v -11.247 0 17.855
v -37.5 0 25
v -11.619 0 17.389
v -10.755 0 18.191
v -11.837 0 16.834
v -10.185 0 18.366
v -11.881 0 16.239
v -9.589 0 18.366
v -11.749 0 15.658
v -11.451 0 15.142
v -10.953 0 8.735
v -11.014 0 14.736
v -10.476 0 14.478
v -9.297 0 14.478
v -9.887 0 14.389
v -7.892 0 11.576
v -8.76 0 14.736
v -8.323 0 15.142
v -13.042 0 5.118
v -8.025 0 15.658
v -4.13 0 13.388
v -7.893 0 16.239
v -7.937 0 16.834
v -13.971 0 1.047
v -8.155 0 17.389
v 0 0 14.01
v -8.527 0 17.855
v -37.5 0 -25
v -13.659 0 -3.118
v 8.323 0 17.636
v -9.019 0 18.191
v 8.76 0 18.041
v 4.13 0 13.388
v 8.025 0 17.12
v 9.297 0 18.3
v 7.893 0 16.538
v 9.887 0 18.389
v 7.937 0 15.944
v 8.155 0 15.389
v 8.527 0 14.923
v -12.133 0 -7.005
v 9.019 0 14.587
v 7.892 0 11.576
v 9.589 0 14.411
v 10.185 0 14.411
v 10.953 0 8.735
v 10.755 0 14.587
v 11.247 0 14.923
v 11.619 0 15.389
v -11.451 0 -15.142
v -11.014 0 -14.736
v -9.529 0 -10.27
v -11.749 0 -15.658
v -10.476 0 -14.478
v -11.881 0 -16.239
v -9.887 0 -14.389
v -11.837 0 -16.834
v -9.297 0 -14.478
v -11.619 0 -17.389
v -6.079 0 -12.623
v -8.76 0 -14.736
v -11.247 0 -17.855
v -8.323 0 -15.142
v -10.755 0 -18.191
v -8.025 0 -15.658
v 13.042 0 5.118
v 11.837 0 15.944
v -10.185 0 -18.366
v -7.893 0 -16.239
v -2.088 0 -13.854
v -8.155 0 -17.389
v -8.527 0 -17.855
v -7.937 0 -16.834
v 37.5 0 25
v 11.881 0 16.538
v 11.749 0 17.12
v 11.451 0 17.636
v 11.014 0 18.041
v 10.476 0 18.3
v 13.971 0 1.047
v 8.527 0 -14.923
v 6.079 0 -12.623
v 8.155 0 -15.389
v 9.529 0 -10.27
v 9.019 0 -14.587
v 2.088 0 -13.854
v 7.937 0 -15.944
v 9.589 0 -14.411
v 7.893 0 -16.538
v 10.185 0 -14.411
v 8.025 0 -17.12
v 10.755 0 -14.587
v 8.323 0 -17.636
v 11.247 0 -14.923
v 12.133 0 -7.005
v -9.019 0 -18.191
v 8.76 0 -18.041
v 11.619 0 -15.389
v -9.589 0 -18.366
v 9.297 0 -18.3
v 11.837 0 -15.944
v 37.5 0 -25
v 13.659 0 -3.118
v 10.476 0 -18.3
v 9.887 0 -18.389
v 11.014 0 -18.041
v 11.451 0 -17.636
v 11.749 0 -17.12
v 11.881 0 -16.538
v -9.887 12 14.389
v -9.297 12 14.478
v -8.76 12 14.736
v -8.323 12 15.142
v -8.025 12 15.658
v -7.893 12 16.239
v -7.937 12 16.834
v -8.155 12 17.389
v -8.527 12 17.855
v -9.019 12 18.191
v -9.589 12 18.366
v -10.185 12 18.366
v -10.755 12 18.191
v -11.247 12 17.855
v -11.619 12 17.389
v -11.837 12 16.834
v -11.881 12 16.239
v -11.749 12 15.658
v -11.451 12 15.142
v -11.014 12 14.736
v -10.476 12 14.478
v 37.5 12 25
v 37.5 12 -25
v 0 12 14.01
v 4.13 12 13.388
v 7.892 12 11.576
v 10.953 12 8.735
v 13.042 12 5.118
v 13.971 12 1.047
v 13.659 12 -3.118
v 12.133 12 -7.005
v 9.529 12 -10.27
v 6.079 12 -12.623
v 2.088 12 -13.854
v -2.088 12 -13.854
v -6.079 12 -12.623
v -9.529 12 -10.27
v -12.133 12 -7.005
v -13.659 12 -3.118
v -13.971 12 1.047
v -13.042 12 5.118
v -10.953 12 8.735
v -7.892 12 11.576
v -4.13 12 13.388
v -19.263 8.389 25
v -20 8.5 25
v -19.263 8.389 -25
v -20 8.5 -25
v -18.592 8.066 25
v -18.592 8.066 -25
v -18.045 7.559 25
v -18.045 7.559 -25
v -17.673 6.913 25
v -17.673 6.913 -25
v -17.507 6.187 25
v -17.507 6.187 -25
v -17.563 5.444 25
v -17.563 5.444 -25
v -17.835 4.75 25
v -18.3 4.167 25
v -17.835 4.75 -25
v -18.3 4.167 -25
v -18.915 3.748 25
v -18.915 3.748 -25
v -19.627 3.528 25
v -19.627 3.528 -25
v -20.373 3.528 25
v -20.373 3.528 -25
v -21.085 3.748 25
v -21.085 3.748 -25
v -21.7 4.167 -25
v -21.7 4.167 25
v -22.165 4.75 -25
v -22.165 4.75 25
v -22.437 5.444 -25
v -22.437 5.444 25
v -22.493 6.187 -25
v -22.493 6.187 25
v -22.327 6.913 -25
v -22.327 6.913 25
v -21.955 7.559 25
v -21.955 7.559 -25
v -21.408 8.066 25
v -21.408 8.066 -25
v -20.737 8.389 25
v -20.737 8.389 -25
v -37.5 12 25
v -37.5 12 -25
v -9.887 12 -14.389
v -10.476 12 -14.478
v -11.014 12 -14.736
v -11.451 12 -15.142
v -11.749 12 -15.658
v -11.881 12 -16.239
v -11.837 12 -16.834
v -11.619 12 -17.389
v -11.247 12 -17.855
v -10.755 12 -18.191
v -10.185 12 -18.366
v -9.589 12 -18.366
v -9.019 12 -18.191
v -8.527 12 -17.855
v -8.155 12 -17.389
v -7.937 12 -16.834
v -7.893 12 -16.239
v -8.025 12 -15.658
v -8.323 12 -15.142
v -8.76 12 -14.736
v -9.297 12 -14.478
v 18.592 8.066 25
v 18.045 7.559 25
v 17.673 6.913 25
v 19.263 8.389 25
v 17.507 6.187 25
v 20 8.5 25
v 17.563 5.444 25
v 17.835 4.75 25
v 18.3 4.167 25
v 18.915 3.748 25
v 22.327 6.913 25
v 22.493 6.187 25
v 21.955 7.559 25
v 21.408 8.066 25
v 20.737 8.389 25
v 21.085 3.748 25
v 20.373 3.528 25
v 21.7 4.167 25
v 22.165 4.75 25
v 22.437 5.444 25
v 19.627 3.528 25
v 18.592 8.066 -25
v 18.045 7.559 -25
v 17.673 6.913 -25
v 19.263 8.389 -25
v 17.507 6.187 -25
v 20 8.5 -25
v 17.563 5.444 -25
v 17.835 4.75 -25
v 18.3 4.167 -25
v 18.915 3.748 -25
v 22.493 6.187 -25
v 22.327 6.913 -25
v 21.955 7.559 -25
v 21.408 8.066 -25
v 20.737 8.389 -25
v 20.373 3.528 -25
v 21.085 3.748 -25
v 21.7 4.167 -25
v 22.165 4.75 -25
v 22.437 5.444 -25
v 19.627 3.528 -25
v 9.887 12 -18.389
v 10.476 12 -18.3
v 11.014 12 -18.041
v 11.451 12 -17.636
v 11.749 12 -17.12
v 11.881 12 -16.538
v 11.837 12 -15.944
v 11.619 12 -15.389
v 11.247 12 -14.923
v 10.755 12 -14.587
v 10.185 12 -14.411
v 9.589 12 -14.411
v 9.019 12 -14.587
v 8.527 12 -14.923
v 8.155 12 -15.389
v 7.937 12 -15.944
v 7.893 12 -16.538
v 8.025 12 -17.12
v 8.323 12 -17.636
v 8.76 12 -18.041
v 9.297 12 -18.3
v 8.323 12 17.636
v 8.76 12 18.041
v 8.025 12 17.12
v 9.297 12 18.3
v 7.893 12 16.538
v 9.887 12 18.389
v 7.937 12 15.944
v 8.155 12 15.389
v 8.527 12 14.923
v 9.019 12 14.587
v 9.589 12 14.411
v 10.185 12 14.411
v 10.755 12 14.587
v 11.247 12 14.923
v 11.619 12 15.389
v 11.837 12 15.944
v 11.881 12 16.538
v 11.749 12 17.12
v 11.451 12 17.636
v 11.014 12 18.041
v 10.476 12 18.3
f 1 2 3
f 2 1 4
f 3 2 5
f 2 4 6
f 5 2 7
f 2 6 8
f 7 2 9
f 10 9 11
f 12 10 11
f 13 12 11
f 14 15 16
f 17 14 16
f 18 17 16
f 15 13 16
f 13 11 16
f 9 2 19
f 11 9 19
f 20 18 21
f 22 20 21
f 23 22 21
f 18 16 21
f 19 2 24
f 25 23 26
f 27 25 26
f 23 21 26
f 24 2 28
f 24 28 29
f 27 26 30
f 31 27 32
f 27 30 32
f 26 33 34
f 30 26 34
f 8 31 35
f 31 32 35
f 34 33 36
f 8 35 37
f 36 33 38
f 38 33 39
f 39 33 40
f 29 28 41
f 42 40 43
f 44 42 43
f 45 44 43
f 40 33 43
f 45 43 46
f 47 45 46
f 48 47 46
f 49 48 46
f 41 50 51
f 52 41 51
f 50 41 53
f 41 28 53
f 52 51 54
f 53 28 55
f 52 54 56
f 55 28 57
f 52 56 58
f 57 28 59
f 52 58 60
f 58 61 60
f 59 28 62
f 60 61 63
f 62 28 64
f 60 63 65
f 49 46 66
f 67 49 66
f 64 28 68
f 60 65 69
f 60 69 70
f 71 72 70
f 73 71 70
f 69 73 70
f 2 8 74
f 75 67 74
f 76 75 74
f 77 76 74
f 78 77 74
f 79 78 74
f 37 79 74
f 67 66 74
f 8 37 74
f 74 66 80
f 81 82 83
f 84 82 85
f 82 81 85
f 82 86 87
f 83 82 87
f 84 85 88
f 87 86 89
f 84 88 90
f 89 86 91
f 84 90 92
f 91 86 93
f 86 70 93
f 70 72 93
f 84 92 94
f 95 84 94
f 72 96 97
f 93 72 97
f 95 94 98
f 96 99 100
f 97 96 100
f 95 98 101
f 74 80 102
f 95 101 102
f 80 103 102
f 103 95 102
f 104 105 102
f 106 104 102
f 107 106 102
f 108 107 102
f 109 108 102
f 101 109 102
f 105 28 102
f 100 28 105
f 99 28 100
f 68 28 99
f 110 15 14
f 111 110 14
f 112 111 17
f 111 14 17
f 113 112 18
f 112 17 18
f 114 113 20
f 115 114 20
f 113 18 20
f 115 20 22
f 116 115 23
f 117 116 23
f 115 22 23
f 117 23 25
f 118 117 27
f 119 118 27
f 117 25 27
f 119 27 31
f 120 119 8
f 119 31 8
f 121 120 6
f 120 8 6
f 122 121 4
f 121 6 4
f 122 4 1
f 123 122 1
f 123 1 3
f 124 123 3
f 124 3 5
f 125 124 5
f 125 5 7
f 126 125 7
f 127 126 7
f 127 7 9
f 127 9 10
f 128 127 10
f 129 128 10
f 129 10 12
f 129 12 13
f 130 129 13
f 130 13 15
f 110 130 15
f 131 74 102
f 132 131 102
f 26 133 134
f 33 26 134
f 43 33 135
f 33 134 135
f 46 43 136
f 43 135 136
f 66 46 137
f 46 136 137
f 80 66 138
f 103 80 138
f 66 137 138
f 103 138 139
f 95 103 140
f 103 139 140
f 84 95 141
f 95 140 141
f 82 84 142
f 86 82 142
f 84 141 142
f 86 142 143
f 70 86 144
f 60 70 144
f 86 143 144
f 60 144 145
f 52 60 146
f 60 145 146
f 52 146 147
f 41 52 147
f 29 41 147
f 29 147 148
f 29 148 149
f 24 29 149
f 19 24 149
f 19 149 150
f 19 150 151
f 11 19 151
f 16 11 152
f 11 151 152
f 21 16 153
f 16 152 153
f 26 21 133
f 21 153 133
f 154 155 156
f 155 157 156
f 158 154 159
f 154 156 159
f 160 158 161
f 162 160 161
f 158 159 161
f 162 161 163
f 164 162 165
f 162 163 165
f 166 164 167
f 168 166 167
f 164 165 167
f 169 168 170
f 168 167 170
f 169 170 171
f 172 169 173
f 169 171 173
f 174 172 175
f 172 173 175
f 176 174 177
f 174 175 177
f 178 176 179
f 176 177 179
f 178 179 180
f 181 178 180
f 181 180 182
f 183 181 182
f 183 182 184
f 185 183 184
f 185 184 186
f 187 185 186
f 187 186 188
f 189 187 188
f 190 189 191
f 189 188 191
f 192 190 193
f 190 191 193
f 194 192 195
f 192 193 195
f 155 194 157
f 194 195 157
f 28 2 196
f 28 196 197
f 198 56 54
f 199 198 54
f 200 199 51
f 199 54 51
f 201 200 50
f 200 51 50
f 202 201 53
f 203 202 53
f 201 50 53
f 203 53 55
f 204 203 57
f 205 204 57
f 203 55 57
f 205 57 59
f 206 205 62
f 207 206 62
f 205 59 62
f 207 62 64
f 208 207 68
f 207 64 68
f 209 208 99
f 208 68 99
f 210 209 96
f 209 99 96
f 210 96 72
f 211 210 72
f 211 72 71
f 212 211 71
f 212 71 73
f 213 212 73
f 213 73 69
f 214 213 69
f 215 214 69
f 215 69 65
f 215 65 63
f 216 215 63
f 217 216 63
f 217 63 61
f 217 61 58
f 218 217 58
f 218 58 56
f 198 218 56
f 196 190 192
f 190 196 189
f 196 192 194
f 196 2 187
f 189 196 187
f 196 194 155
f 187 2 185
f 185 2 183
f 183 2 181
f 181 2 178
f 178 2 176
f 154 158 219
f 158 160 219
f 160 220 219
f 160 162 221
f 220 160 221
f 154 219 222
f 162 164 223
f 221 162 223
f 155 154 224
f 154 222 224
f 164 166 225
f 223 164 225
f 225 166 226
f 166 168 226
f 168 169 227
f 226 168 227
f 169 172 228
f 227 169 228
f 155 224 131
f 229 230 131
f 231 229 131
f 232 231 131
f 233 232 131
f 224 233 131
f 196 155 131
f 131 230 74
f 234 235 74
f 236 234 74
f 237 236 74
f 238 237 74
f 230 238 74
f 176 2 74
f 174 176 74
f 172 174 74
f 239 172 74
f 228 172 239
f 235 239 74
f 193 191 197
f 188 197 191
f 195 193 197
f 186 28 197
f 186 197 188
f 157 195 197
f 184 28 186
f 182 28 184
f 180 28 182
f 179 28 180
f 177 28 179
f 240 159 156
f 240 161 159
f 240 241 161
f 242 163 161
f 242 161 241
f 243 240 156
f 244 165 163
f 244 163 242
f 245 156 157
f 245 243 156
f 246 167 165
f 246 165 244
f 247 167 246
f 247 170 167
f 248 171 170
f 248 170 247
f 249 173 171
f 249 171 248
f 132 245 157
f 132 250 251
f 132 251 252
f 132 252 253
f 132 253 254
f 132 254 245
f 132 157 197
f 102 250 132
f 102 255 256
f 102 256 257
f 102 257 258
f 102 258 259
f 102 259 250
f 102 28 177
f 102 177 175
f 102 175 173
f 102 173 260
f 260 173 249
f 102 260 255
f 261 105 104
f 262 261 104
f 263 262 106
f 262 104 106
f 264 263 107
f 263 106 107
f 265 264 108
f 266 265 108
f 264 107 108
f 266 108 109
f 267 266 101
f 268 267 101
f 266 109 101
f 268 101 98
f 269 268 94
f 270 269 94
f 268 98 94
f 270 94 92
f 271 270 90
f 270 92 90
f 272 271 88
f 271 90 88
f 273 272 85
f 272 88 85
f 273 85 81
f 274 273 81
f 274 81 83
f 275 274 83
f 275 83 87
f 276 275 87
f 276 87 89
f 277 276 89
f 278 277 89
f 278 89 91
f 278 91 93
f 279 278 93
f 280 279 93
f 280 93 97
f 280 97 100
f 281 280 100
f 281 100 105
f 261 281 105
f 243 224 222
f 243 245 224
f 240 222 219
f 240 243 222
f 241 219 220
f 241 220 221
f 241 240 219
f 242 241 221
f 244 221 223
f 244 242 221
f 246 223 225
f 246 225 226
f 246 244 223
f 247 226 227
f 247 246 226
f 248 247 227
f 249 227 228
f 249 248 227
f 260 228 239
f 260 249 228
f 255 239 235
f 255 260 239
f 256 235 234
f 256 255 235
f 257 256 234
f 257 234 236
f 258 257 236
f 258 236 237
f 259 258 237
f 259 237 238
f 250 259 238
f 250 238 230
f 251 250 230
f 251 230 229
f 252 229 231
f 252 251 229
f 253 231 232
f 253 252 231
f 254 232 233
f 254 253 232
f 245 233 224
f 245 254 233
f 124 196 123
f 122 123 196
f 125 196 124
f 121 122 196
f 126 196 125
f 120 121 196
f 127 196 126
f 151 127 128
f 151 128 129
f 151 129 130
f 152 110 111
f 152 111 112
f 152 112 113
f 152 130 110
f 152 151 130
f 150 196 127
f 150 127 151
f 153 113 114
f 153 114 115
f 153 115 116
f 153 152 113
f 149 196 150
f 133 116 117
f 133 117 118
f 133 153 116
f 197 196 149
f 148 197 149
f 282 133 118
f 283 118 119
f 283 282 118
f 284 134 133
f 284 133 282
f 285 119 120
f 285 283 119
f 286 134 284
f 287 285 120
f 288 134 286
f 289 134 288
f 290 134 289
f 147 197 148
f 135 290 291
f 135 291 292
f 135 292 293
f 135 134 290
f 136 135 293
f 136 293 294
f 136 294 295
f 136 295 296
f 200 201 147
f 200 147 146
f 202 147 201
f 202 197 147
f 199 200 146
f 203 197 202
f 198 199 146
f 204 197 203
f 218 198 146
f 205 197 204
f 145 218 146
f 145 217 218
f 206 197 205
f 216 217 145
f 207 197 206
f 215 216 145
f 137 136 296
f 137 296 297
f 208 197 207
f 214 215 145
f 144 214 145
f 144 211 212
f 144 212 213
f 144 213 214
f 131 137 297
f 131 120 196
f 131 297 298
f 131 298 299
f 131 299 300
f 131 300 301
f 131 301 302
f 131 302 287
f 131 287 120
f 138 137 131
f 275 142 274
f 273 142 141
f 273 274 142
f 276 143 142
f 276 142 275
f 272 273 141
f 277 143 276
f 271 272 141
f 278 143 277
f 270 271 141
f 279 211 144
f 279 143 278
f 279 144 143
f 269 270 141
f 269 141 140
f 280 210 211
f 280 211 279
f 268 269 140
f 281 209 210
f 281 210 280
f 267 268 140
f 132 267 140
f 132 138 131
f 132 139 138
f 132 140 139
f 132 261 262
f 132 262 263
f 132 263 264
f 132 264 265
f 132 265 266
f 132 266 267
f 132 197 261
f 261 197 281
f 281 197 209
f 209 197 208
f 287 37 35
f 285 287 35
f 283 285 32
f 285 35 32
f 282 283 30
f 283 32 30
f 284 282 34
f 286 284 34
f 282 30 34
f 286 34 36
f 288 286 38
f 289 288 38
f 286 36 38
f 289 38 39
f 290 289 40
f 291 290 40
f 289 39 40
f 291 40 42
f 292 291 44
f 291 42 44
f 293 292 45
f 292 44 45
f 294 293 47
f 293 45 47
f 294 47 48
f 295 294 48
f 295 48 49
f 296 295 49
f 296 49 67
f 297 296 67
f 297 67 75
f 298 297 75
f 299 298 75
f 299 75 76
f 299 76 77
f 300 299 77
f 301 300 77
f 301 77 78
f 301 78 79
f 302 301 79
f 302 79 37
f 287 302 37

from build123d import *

# Parameters (mm, degrees)
SKETCH1_W           = 75
SKETCH1_H           = 50
BOSS_EXTRUDE1_DEPTH = 12
SKETCH2_R           = 14.01
CUT_EXTRUDE1_DEPTH  = 12
SKETCH9_R           = 2
CUT_EXTRUDE2_DEPTH  = 19


with BuildPart() as part:
    # Sketch1 → Boss-Extrude1 (new body)
    with BuildSketch(Plane(origin=(0, 0, 0), x_dir=(1, 0, 0), z_dir=(0, 1, 0))):
        Rectangle(SKETCH1_W, SKETCH1_H)
    extrude(amount=BOSS_EXTRUDE1_DEPTH)

    # Sketch2 → Cut-Extrude1 (cut)
    with BuildSketch(Plane(origin=(0, 12, 0), x_dir=(1, 0, 0), z_dir=(0, 1, 0))):
        with Locations(Location((0, 0, 0), (0, 0, 270))):
            Circle(SKETCH2_R)
    extrude(amount=-CUT_EXTRUDE1_DEPTH, mode=Mode.SUBTRACT)

    # Sketch9 → Cut-Extrude2 (cut)
    with BuildSketch(Plane.XZ):
        with Locations(Location((-9.886968549, 16.388822862, 0), (0, 0, 270))):
            Circle(SKETCH9_R)
        with Locations(Location((9.886968549, 16.388822862, 0), (0, 0, 90))):
            Circle(SKETCH9_R)
        with Locations(Location((-9.886968549, -16.388822862, 0), (0, 0, 90))):
            Circle(SKETCH9_R)
        with Locations(Location((9.886968549, -16.388822862, 0), (0, 0, 270))):
            Circle(SKETCH9_R)
    extrude(amount=-CUT_EXTRUDE2_DEPTH, mode=Mode.SUBTRACT)

    # Sketch11 → Ø5.0mm Dowel Hole1 (revolve, cut)
    with BuildSketch(Plane(origin=(20, 6, -25), x_dir=(0, 1, 0), z_dir=(1, 0, 0))):
        Polygon((0, 0), (0, 51.502151548), (2.5, 50), (2.5, 0), align=None)
    f_5_0mm_dowel_hole1 = revolve(axis=Axis((20, 6, -31.35), (0, 0, 1)), mode=Mode.SUBTRACT)

    # Mirror1: Ø5.0mm Dowel Hole1 across plane
    add(f_5_0mm_dowel_hole1.mirror(Plane(origin=(0, 0, 0), x_dir=(0, 0, 1), z_dir=(1, 0, 0))), mode=Mode.SUBTRACT)


solid = part.part
